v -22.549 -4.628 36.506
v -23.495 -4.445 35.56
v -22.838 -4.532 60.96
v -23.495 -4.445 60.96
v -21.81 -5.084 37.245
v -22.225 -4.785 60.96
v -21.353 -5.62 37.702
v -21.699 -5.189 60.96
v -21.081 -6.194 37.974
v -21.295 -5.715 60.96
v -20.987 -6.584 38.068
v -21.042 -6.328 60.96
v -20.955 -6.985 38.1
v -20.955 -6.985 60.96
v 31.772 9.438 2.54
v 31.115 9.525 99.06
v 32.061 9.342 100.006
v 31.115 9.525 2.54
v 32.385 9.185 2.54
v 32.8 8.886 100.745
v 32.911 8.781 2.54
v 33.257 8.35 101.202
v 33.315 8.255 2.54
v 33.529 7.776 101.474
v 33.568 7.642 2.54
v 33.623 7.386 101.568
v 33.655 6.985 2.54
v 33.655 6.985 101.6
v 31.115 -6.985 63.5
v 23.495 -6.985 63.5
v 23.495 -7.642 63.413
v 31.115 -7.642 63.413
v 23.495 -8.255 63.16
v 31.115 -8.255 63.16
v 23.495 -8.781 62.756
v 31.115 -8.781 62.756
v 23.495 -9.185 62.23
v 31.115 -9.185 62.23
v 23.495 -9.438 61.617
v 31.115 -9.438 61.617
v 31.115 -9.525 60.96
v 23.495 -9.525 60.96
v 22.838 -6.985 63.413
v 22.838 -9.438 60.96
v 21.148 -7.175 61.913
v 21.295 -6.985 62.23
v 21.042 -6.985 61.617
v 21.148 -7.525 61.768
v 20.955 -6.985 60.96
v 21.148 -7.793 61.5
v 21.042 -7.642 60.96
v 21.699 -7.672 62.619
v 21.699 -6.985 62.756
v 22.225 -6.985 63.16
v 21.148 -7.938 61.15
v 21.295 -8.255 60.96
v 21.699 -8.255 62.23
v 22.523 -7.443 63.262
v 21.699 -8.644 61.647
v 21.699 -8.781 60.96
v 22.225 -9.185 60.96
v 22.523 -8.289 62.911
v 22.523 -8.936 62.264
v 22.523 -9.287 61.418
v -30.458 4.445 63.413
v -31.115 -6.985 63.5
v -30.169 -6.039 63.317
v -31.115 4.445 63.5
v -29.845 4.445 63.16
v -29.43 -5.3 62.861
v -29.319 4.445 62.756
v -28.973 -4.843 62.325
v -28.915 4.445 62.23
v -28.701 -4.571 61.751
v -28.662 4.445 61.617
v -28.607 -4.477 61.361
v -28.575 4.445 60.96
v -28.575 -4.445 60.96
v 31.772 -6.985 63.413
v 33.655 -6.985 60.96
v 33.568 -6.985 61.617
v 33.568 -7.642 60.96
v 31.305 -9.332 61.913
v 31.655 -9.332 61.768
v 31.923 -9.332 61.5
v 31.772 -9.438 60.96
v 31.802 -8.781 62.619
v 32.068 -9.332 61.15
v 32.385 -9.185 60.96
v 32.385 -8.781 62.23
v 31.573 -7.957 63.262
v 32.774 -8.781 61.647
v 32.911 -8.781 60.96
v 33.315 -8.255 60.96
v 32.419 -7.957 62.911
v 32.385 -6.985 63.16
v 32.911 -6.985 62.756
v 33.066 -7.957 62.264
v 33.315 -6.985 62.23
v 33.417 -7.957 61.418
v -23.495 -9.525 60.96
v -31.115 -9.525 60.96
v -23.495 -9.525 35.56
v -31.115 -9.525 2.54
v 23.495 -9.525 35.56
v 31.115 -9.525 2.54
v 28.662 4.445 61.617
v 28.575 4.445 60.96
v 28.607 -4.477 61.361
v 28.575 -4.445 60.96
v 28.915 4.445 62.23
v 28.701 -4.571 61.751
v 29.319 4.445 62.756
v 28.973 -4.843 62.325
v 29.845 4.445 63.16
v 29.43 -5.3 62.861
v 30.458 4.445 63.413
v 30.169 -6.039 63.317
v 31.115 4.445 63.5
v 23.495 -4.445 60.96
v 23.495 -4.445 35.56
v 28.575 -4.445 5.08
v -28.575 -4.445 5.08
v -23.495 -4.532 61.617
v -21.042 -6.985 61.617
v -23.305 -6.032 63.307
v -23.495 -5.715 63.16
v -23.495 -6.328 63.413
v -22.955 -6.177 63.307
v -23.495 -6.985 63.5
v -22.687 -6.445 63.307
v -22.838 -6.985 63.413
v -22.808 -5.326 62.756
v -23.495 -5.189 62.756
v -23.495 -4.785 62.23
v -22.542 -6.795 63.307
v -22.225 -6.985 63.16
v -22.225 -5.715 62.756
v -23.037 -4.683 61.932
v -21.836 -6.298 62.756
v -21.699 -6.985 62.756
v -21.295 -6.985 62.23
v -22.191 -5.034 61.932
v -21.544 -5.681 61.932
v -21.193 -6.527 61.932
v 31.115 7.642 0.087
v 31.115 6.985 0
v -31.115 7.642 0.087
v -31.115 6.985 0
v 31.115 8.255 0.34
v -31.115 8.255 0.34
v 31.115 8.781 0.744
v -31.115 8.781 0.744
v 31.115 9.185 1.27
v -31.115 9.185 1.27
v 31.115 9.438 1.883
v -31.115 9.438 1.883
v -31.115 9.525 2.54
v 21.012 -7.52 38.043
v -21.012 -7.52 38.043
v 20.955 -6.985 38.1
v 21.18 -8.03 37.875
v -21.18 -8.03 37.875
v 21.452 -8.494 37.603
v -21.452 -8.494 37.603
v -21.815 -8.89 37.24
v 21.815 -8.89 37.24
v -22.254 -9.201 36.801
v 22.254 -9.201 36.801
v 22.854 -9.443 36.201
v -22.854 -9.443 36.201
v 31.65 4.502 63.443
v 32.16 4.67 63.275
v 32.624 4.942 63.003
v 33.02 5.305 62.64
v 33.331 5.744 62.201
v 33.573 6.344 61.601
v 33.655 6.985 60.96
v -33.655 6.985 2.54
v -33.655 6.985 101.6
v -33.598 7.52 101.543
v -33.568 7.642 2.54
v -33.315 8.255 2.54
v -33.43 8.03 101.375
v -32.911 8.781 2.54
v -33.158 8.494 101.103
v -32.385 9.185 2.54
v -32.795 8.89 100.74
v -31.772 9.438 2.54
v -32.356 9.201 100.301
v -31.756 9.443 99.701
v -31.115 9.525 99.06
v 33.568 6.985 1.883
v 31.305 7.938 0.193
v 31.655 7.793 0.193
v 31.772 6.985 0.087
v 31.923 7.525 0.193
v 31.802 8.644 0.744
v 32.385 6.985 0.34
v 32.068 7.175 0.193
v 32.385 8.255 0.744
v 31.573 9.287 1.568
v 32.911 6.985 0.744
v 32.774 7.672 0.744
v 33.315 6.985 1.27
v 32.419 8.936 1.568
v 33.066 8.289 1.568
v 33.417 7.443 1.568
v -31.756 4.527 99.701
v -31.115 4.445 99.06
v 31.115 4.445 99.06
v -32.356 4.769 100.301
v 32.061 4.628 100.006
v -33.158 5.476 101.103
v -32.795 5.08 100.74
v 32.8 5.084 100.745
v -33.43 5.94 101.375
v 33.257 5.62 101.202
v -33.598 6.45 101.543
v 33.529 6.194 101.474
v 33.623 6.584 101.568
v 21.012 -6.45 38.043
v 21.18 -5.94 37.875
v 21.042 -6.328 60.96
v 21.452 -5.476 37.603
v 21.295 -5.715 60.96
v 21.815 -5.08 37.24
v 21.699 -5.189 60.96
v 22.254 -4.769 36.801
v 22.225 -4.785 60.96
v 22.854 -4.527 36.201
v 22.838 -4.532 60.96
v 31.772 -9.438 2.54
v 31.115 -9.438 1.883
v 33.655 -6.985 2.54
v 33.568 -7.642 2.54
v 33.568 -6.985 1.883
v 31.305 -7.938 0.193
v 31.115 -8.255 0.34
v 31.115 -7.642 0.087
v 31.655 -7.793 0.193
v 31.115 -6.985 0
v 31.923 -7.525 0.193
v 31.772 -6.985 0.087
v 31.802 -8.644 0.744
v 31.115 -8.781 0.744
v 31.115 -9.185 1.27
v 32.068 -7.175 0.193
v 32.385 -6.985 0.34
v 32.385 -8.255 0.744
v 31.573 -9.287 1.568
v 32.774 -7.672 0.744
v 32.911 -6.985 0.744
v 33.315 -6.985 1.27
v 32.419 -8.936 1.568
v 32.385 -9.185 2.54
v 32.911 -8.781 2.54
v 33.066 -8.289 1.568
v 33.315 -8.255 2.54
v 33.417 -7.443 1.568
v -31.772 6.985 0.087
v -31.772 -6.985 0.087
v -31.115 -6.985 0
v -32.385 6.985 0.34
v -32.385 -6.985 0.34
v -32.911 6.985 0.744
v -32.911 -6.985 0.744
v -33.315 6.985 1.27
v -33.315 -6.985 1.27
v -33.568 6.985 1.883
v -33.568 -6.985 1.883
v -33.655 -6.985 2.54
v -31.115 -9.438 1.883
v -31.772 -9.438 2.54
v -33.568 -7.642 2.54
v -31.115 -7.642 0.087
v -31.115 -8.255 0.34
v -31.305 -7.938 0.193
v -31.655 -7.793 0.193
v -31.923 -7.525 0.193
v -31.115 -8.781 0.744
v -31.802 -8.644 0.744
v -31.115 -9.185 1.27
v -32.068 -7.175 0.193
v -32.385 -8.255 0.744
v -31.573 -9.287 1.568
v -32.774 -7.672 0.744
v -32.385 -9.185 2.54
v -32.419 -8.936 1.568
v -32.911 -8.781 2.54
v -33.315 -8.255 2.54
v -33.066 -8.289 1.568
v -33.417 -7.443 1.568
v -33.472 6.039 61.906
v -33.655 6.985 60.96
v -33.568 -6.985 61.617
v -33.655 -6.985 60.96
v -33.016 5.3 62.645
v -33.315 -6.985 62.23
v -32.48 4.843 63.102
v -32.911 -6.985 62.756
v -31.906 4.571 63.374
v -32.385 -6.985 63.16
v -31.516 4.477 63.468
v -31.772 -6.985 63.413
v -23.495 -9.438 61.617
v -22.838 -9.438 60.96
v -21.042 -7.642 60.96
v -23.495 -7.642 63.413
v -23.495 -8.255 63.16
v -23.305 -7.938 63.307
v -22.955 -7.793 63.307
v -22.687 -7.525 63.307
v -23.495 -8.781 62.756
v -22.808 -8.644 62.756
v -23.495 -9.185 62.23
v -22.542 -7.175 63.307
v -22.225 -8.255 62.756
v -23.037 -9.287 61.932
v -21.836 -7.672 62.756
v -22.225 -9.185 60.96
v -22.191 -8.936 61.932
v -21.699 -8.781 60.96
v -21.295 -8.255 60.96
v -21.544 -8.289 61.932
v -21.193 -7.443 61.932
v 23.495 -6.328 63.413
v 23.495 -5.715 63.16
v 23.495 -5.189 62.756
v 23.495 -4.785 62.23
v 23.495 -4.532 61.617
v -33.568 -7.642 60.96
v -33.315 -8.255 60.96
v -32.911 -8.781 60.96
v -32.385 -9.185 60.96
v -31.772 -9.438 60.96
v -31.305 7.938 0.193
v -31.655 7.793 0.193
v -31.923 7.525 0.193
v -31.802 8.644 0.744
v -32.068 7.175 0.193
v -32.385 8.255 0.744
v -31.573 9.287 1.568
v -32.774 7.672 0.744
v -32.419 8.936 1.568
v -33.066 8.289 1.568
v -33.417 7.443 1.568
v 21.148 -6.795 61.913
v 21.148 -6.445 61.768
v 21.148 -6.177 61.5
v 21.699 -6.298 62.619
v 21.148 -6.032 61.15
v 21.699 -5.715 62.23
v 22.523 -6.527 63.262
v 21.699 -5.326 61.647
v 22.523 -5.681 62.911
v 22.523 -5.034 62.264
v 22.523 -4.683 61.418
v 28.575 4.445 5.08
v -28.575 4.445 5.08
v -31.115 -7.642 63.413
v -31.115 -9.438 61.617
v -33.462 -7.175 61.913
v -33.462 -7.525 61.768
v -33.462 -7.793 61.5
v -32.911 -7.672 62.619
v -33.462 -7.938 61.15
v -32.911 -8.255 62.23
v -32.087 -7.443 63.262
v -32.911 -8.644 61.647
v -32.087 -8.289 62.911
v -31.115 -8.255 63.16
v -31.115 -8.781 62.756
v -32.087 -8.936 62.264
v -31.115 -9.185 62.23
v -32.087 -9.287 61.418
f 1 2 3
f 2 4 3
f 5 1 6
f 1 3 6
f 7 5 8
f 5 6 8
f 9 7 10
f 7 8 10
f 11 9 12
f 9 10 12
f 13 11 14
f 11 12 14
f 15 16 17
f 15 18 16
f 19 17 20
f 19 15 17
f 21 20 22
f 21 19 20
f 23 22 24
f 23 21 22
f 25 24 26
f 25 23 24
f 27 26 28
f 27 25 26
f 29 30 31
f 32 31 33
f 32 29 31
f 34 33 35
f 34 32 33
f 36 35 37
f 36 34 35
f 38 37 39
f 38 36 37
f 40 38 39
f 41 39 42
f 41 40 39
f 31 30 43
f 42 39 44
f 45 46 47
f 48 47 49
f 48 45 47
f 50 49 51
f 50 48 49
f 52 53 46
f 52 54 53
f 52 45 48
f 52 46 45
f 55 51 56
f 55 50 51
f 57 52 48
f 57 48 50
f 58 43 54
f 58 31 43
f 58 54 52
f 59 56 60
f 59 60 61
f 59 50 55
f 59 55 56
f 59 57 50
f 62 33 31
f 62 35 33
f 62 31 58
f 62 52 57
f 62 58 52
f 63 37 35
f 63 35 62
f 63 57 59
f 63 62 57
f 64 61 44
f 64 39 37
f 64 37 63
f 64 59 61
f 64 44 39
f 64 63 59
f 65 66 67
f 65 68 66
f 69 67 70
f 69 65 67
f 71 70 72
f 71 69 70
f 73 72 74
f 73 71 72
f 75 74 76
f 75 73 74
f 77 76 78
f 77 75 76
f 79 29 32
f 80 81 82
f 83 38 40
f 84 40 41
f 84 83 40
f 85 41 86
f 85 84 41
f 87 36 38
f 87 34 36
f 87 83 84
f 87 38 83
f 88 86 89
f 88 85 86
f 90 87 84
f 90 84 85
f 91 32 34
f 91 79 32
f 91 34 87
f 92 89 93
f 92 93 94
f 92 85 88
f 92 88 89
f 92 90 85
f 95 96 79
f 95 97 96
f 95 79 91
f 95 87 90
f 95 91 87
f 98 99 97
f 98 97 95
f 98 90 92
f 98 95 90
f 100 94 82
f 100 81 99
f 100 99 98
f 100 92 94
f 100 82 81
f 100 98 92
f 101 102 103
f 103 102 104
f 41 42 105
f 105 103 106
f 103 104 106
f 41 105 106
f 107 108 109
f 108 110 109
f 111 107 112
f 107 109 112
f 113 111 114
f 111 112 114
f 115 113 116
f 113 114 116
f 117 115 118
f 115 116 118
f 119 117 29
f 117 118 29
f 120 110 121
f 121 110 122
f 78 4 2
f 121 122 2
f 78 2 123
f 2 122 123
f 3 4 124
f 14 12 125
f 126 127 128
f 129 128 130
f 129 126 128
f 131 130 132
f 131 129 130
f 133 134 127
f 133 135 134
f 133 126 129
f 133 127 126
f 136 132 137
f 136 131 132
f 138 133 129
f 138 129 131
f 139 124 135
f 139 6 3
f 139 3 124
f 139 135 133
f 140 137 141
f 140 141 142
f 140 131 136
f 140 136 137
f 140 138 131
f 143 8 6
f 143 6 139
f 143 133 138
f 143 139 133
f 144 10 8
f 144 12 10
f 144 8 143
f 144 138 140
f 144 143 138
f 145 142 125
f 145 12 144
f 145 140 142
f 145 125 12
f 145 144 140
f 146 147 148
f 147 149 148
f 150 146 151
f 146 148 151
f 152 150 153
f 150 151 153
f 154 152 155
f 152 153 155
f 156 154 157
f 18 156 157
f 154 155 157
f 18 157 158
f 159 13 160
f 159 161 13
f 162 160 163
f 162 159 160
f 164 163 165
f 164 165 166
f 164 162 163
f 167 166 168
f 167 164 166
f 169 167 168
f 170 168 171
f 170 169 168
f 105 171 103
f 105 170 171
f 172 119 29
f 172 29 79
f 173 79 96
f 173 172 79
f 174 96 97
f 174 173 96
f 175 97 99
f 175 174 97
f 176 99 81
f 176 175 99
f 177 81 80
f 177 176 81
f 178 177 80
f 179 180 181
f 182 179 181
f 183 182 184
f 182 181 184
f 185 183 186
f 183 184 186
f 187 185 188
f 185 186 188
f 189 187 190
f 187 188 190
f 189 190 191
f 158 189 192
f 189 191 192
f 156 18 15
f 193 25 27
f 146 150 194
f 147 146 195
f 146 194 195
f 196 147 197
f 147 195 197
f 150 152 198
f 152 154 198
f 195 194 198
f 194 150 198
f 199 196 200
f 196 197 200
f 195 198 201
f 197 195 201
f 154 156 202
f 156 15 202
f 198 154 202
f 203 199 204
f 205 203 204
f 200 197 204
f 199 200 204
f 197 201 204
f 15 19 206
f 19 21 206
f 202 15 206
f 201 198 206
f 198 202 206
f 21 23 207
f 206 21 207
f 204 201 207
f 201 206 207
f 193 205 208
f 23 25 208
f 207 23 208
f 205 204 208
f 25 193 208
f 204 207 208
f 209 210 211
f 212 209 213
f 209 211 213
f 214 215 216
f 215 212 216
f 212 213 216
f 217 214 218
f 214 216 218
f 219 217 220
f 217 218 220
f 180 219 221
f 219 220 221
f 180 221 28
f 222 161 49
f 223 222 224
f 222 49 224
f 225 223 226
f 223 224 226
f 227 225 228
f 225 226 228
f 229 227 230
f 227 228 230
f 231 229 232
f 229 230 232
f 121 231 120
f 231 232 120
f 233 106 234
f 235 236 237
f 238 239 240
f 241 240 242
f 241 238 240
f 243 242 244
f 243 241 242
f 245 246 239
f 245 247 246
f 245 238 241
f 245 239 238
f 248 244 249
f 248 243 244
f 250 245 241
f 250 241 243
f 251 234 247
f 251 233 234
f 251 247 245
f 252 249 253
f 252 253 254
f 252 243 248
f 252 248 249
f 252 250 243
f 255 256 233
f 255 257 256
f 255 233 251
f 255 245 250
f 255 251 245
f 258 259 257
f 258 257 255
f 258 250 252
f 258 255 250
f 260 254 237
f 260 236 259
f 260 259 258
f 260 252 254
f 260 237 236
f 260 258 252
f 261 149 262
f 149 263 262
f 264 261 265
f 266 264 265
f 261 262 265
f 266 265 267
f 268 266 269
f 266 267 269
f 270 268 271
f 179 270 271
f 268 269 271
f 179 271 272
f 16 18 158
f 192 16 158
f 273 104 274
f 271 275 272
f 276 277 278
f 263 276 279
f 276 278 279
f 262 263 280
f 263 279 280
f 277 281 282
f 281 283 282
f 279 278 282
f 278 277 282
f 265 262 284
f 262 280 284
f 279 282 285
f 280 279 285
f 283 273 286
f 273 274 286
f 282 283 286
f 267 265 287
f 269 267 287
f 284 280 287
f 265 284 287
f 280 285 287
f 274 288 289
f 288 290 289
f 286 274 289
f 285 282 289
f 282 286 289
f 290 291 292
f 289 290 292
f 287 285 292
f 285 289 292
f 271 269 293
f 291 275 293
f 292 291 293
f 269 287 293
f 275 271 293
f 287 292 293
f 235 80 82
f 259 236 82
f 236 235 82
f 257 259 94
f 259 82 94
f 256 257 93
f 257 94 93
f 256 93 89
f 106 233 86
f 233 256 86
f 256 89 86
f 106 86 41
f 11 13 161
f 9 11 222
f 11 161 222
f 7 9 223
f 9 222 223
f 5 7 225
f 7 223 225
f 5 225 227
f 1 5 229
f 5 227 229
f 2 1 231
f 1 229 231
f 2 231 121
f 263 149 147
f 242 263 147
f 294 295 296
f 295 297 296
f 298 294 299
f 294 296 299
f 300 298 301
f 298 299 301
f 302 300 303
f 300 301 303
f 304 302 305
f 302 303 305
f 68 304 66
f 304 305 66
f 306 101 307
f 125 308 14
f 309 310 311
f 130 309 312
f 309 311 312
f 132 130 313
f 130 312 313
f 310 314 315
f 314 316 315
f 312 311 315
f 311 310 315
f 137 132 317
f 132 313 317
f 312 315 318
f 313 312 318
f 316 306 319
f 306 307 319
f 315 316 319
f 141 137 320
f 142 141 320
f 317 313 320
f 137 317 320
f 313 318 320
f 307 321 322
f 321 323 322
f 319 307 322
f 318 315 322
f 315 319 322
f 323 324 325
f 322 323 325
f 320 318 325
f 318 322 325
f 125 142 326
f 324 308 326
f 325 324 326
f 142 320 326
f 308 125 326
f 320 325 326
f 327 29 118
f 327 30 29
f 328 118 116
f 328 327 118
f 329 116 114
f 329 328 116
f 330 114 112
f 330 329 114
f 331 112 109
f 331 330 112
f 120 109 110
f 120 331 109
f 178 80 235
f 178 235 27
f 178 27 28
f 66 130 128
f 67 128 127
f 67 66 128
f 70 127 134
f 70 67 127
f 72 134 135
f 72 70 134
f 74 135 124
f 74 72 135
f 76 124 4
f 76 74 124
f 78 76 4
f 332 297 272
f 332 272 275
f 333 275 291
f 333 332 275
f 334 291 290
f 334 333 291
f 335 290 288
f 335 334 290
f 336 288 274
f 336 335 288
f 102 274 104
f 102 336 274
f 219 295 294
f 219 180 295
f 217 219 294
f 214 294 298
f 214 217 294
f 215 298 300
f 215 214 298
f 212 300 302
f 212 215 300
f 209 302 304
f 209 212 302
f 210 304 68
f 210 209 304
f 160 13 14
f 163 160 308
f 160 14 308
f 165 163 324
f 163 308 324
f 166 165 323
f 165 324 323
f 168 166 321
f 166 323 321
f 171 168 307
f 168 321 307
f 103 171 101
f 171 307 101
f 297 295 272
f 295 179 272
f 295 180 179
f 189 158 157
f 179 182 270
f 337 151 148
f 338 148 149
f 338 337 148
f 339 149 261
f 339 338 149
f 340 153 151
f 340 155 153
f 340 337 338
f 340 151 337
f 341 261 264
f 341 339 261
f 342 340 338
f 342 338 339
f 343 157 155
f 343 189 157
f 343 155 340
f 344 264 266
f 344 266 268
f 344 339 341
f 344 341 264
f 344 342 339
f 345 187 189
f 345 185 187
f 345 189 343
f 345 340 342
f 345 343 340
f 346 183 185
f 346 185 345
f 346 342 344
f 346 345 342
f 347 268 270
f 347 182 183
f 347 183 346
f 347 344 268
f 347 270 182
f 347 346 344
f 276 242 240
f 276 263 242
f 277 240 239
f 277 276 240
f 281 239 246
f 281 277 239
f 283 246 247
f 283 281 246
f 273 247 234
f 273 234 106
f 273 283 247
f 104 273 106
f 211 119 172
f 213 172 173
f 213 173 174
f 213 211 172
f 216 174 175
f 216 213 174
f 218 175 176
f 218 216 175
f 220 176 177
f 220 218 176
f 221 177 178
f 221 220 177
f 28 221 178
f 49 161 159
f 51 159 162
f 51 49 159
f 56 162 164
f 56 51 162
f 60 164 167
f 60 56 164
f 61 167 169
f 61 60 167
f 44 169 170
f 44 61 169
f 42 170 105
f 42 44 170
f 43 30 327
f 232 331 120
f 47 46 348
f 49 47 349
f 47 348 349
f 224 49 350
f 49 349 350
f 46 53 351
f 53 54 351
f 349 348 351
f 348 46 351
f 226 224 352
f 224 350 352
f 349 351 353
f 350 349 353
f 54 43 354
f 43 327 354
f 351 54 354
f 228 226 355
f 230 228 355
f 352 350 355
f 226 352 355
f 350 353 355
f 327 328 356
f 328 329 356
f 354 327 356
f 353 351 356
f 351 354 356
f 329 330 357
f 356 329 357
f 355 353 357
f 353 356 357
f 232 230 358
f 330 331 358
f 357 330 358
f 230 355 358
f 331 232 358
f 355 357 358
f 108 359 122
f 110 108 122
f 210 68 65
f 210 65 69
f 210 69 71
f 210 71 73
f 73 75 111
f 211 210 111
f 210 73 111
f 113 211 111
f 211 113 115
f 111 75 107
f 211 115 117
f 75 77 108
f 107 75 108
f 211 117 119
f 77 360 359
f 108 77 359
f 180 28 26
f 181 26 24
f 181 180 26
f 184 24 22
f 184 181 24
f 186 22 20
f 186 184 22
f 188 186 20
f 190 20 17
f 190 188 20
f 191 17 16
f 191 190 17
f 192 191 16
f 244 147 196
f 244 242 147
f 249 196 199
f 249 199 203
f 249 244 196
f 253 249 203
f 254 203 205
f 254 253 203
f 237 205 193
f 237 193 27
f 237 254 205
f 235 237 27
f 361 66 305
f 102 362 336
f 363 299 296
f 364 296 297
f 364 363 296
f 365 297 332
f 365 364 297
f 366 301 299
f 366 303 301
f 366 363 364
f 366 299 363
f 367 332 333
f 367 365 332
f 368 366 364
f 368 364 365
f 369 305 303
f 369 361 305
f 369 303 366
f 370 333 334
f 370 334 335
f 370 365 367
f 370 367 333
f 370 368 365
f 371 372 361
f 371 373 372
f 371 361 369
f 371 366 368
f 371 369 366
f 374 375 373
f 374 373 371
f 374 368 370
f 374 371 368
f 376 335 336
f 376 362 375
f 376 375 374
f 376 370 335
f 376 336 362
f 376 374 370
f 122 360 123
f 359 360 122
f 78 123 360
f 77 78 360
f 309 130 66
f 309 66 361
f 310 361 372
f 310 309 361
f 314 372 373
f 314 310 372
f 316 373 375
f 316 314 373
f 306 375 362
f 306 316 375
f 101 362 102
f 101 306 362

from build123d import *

# Parameters (mm, degrees)
F0_W     = 41.91
F0_H     = 5.08
F1_DEPTH = 5.08
F2_DEPTH = 101.6
F3_DEPTH = 63.5
F4_DEPTH = 38.1
F5_R     = 2.53999


# Not quite as in the source:
# - a fillet or chamfer is up to 0.001 mm smaller than in the source, because OpenCascade refuses the exact size


with BuildPart() as f1:
    # F0 (on Top) → F1 (new body)
    with BuildSketch(Plane.XY):
        Polygon((33.655, 9.525), (-33.655, 9.525), (-33.655, 4.445), (-28.575, 4.445), (28.575, 4.445), (33.655, 4.445), align=None)
        Polygon((-28.575, 4.445), (-33.655, 4.445), (-33.655, -9.525), (-20.955, -9.525), (-20.955, -4.445), (-28.575, -4.445), align=None)
        Polygon((33.655, -9.525), (33.655, 4.445), (28.575, 4.445), (28.575, -4.445), (20.955, -4.445), (20.955, -9.525), align=None)
        with Locations((0, -6.985)):
            Rectangle(F0_W, F0_H)
        Polygon((28.575, 4.445), (-28.575, 4.445), (-28.575, -4.445), (-20.955, -4.445), (20.955, -4.445), (28.575, -4.445), align=None)
    extrude(amount=F1_DEPTH)

    # F0 (on Top) → F2 (join)
    with BuildSketch(Plane.XY):
        Polygon((33.655, 9.525), (-33.655, 9.525), (-33.655, 4.445), (-28.575, 4.445), (28.575, 4.445), (33.655, 4.445), align=None)
    extrude(amount=F2_DEPTH)

    # F0 (on Top) → F3 (join)
    with BuildSketch(Plane.XY):
        Polygon((-28.575, 4.445), (-33.655, 4.445), (-33.655, -9.525), (-20.955, -9.525), (-20.955, -4.445), (-28.575, -4.445), align=None)
        Polygon((33.655, -9.525), (33.655, 4.445), (28.575, 4.445), (28.575, -4.445), (20.955, -4.445), (20.955, -9.525), align=None)
    extrude(amount=F3_DEPTH)

    # F0 (on Top) → F4 (join)
    with BuildSketch(Plane.XY):
        with Locations((0, -6.985)):
            Rectangle(F0_W, F0_H)
    extrude(amount=F4_DEPTH)

    # F5 (radius 2.54 in the source; OpenCascade refuses exactly that, so slightly less here)
    f5_edges = [f1.edges().sort_by_distance(p)[0] for p in [
        (-33.655, 4.445, 82.55),
        (33.655, 9.525, 50.8),
        (33.655, 4.445, 82.55),
        (0, 4.445, 101.6),
        (0, 9.525, 101.6),
        (-33.655, 9.525, 50.8),
        (0, 9.525, 0),
        (33.655, -2.54, 63.5),
        (24.765, -4.445, 63.5),
        (28.575, 0, 63.5),
        (27.305, -9.525, 63.5),
        (20.955, -6.985, 63.5),
        (33.655, -9.525, 31.75),
        (20.955, -9.525, 50.8),
        (0, -9.525, 38.1),
        (-20.955, -9.525, 50.8),
        (-20.955, -4.445, 50.8),
        (-27.305, -9.525, 63.5),
        (-24.765, -4.445, 63.5),
        (-28.575, 0, 63.5),
        (-33.655, -2.54, 63.5),
        (-33.655, -9.525, 31.75),
        (0, -9.525, 0),
        (33.655, 0, 0),
        (-33.655, 0, 0),
        (-20.955, -6.985, 63.5),
        (0, -4.445, 38.1),
        (20.955, -4.445, 50.8),
    ]]
    fillet(f5_edges, radius=F5_R)


solid = f1.part
